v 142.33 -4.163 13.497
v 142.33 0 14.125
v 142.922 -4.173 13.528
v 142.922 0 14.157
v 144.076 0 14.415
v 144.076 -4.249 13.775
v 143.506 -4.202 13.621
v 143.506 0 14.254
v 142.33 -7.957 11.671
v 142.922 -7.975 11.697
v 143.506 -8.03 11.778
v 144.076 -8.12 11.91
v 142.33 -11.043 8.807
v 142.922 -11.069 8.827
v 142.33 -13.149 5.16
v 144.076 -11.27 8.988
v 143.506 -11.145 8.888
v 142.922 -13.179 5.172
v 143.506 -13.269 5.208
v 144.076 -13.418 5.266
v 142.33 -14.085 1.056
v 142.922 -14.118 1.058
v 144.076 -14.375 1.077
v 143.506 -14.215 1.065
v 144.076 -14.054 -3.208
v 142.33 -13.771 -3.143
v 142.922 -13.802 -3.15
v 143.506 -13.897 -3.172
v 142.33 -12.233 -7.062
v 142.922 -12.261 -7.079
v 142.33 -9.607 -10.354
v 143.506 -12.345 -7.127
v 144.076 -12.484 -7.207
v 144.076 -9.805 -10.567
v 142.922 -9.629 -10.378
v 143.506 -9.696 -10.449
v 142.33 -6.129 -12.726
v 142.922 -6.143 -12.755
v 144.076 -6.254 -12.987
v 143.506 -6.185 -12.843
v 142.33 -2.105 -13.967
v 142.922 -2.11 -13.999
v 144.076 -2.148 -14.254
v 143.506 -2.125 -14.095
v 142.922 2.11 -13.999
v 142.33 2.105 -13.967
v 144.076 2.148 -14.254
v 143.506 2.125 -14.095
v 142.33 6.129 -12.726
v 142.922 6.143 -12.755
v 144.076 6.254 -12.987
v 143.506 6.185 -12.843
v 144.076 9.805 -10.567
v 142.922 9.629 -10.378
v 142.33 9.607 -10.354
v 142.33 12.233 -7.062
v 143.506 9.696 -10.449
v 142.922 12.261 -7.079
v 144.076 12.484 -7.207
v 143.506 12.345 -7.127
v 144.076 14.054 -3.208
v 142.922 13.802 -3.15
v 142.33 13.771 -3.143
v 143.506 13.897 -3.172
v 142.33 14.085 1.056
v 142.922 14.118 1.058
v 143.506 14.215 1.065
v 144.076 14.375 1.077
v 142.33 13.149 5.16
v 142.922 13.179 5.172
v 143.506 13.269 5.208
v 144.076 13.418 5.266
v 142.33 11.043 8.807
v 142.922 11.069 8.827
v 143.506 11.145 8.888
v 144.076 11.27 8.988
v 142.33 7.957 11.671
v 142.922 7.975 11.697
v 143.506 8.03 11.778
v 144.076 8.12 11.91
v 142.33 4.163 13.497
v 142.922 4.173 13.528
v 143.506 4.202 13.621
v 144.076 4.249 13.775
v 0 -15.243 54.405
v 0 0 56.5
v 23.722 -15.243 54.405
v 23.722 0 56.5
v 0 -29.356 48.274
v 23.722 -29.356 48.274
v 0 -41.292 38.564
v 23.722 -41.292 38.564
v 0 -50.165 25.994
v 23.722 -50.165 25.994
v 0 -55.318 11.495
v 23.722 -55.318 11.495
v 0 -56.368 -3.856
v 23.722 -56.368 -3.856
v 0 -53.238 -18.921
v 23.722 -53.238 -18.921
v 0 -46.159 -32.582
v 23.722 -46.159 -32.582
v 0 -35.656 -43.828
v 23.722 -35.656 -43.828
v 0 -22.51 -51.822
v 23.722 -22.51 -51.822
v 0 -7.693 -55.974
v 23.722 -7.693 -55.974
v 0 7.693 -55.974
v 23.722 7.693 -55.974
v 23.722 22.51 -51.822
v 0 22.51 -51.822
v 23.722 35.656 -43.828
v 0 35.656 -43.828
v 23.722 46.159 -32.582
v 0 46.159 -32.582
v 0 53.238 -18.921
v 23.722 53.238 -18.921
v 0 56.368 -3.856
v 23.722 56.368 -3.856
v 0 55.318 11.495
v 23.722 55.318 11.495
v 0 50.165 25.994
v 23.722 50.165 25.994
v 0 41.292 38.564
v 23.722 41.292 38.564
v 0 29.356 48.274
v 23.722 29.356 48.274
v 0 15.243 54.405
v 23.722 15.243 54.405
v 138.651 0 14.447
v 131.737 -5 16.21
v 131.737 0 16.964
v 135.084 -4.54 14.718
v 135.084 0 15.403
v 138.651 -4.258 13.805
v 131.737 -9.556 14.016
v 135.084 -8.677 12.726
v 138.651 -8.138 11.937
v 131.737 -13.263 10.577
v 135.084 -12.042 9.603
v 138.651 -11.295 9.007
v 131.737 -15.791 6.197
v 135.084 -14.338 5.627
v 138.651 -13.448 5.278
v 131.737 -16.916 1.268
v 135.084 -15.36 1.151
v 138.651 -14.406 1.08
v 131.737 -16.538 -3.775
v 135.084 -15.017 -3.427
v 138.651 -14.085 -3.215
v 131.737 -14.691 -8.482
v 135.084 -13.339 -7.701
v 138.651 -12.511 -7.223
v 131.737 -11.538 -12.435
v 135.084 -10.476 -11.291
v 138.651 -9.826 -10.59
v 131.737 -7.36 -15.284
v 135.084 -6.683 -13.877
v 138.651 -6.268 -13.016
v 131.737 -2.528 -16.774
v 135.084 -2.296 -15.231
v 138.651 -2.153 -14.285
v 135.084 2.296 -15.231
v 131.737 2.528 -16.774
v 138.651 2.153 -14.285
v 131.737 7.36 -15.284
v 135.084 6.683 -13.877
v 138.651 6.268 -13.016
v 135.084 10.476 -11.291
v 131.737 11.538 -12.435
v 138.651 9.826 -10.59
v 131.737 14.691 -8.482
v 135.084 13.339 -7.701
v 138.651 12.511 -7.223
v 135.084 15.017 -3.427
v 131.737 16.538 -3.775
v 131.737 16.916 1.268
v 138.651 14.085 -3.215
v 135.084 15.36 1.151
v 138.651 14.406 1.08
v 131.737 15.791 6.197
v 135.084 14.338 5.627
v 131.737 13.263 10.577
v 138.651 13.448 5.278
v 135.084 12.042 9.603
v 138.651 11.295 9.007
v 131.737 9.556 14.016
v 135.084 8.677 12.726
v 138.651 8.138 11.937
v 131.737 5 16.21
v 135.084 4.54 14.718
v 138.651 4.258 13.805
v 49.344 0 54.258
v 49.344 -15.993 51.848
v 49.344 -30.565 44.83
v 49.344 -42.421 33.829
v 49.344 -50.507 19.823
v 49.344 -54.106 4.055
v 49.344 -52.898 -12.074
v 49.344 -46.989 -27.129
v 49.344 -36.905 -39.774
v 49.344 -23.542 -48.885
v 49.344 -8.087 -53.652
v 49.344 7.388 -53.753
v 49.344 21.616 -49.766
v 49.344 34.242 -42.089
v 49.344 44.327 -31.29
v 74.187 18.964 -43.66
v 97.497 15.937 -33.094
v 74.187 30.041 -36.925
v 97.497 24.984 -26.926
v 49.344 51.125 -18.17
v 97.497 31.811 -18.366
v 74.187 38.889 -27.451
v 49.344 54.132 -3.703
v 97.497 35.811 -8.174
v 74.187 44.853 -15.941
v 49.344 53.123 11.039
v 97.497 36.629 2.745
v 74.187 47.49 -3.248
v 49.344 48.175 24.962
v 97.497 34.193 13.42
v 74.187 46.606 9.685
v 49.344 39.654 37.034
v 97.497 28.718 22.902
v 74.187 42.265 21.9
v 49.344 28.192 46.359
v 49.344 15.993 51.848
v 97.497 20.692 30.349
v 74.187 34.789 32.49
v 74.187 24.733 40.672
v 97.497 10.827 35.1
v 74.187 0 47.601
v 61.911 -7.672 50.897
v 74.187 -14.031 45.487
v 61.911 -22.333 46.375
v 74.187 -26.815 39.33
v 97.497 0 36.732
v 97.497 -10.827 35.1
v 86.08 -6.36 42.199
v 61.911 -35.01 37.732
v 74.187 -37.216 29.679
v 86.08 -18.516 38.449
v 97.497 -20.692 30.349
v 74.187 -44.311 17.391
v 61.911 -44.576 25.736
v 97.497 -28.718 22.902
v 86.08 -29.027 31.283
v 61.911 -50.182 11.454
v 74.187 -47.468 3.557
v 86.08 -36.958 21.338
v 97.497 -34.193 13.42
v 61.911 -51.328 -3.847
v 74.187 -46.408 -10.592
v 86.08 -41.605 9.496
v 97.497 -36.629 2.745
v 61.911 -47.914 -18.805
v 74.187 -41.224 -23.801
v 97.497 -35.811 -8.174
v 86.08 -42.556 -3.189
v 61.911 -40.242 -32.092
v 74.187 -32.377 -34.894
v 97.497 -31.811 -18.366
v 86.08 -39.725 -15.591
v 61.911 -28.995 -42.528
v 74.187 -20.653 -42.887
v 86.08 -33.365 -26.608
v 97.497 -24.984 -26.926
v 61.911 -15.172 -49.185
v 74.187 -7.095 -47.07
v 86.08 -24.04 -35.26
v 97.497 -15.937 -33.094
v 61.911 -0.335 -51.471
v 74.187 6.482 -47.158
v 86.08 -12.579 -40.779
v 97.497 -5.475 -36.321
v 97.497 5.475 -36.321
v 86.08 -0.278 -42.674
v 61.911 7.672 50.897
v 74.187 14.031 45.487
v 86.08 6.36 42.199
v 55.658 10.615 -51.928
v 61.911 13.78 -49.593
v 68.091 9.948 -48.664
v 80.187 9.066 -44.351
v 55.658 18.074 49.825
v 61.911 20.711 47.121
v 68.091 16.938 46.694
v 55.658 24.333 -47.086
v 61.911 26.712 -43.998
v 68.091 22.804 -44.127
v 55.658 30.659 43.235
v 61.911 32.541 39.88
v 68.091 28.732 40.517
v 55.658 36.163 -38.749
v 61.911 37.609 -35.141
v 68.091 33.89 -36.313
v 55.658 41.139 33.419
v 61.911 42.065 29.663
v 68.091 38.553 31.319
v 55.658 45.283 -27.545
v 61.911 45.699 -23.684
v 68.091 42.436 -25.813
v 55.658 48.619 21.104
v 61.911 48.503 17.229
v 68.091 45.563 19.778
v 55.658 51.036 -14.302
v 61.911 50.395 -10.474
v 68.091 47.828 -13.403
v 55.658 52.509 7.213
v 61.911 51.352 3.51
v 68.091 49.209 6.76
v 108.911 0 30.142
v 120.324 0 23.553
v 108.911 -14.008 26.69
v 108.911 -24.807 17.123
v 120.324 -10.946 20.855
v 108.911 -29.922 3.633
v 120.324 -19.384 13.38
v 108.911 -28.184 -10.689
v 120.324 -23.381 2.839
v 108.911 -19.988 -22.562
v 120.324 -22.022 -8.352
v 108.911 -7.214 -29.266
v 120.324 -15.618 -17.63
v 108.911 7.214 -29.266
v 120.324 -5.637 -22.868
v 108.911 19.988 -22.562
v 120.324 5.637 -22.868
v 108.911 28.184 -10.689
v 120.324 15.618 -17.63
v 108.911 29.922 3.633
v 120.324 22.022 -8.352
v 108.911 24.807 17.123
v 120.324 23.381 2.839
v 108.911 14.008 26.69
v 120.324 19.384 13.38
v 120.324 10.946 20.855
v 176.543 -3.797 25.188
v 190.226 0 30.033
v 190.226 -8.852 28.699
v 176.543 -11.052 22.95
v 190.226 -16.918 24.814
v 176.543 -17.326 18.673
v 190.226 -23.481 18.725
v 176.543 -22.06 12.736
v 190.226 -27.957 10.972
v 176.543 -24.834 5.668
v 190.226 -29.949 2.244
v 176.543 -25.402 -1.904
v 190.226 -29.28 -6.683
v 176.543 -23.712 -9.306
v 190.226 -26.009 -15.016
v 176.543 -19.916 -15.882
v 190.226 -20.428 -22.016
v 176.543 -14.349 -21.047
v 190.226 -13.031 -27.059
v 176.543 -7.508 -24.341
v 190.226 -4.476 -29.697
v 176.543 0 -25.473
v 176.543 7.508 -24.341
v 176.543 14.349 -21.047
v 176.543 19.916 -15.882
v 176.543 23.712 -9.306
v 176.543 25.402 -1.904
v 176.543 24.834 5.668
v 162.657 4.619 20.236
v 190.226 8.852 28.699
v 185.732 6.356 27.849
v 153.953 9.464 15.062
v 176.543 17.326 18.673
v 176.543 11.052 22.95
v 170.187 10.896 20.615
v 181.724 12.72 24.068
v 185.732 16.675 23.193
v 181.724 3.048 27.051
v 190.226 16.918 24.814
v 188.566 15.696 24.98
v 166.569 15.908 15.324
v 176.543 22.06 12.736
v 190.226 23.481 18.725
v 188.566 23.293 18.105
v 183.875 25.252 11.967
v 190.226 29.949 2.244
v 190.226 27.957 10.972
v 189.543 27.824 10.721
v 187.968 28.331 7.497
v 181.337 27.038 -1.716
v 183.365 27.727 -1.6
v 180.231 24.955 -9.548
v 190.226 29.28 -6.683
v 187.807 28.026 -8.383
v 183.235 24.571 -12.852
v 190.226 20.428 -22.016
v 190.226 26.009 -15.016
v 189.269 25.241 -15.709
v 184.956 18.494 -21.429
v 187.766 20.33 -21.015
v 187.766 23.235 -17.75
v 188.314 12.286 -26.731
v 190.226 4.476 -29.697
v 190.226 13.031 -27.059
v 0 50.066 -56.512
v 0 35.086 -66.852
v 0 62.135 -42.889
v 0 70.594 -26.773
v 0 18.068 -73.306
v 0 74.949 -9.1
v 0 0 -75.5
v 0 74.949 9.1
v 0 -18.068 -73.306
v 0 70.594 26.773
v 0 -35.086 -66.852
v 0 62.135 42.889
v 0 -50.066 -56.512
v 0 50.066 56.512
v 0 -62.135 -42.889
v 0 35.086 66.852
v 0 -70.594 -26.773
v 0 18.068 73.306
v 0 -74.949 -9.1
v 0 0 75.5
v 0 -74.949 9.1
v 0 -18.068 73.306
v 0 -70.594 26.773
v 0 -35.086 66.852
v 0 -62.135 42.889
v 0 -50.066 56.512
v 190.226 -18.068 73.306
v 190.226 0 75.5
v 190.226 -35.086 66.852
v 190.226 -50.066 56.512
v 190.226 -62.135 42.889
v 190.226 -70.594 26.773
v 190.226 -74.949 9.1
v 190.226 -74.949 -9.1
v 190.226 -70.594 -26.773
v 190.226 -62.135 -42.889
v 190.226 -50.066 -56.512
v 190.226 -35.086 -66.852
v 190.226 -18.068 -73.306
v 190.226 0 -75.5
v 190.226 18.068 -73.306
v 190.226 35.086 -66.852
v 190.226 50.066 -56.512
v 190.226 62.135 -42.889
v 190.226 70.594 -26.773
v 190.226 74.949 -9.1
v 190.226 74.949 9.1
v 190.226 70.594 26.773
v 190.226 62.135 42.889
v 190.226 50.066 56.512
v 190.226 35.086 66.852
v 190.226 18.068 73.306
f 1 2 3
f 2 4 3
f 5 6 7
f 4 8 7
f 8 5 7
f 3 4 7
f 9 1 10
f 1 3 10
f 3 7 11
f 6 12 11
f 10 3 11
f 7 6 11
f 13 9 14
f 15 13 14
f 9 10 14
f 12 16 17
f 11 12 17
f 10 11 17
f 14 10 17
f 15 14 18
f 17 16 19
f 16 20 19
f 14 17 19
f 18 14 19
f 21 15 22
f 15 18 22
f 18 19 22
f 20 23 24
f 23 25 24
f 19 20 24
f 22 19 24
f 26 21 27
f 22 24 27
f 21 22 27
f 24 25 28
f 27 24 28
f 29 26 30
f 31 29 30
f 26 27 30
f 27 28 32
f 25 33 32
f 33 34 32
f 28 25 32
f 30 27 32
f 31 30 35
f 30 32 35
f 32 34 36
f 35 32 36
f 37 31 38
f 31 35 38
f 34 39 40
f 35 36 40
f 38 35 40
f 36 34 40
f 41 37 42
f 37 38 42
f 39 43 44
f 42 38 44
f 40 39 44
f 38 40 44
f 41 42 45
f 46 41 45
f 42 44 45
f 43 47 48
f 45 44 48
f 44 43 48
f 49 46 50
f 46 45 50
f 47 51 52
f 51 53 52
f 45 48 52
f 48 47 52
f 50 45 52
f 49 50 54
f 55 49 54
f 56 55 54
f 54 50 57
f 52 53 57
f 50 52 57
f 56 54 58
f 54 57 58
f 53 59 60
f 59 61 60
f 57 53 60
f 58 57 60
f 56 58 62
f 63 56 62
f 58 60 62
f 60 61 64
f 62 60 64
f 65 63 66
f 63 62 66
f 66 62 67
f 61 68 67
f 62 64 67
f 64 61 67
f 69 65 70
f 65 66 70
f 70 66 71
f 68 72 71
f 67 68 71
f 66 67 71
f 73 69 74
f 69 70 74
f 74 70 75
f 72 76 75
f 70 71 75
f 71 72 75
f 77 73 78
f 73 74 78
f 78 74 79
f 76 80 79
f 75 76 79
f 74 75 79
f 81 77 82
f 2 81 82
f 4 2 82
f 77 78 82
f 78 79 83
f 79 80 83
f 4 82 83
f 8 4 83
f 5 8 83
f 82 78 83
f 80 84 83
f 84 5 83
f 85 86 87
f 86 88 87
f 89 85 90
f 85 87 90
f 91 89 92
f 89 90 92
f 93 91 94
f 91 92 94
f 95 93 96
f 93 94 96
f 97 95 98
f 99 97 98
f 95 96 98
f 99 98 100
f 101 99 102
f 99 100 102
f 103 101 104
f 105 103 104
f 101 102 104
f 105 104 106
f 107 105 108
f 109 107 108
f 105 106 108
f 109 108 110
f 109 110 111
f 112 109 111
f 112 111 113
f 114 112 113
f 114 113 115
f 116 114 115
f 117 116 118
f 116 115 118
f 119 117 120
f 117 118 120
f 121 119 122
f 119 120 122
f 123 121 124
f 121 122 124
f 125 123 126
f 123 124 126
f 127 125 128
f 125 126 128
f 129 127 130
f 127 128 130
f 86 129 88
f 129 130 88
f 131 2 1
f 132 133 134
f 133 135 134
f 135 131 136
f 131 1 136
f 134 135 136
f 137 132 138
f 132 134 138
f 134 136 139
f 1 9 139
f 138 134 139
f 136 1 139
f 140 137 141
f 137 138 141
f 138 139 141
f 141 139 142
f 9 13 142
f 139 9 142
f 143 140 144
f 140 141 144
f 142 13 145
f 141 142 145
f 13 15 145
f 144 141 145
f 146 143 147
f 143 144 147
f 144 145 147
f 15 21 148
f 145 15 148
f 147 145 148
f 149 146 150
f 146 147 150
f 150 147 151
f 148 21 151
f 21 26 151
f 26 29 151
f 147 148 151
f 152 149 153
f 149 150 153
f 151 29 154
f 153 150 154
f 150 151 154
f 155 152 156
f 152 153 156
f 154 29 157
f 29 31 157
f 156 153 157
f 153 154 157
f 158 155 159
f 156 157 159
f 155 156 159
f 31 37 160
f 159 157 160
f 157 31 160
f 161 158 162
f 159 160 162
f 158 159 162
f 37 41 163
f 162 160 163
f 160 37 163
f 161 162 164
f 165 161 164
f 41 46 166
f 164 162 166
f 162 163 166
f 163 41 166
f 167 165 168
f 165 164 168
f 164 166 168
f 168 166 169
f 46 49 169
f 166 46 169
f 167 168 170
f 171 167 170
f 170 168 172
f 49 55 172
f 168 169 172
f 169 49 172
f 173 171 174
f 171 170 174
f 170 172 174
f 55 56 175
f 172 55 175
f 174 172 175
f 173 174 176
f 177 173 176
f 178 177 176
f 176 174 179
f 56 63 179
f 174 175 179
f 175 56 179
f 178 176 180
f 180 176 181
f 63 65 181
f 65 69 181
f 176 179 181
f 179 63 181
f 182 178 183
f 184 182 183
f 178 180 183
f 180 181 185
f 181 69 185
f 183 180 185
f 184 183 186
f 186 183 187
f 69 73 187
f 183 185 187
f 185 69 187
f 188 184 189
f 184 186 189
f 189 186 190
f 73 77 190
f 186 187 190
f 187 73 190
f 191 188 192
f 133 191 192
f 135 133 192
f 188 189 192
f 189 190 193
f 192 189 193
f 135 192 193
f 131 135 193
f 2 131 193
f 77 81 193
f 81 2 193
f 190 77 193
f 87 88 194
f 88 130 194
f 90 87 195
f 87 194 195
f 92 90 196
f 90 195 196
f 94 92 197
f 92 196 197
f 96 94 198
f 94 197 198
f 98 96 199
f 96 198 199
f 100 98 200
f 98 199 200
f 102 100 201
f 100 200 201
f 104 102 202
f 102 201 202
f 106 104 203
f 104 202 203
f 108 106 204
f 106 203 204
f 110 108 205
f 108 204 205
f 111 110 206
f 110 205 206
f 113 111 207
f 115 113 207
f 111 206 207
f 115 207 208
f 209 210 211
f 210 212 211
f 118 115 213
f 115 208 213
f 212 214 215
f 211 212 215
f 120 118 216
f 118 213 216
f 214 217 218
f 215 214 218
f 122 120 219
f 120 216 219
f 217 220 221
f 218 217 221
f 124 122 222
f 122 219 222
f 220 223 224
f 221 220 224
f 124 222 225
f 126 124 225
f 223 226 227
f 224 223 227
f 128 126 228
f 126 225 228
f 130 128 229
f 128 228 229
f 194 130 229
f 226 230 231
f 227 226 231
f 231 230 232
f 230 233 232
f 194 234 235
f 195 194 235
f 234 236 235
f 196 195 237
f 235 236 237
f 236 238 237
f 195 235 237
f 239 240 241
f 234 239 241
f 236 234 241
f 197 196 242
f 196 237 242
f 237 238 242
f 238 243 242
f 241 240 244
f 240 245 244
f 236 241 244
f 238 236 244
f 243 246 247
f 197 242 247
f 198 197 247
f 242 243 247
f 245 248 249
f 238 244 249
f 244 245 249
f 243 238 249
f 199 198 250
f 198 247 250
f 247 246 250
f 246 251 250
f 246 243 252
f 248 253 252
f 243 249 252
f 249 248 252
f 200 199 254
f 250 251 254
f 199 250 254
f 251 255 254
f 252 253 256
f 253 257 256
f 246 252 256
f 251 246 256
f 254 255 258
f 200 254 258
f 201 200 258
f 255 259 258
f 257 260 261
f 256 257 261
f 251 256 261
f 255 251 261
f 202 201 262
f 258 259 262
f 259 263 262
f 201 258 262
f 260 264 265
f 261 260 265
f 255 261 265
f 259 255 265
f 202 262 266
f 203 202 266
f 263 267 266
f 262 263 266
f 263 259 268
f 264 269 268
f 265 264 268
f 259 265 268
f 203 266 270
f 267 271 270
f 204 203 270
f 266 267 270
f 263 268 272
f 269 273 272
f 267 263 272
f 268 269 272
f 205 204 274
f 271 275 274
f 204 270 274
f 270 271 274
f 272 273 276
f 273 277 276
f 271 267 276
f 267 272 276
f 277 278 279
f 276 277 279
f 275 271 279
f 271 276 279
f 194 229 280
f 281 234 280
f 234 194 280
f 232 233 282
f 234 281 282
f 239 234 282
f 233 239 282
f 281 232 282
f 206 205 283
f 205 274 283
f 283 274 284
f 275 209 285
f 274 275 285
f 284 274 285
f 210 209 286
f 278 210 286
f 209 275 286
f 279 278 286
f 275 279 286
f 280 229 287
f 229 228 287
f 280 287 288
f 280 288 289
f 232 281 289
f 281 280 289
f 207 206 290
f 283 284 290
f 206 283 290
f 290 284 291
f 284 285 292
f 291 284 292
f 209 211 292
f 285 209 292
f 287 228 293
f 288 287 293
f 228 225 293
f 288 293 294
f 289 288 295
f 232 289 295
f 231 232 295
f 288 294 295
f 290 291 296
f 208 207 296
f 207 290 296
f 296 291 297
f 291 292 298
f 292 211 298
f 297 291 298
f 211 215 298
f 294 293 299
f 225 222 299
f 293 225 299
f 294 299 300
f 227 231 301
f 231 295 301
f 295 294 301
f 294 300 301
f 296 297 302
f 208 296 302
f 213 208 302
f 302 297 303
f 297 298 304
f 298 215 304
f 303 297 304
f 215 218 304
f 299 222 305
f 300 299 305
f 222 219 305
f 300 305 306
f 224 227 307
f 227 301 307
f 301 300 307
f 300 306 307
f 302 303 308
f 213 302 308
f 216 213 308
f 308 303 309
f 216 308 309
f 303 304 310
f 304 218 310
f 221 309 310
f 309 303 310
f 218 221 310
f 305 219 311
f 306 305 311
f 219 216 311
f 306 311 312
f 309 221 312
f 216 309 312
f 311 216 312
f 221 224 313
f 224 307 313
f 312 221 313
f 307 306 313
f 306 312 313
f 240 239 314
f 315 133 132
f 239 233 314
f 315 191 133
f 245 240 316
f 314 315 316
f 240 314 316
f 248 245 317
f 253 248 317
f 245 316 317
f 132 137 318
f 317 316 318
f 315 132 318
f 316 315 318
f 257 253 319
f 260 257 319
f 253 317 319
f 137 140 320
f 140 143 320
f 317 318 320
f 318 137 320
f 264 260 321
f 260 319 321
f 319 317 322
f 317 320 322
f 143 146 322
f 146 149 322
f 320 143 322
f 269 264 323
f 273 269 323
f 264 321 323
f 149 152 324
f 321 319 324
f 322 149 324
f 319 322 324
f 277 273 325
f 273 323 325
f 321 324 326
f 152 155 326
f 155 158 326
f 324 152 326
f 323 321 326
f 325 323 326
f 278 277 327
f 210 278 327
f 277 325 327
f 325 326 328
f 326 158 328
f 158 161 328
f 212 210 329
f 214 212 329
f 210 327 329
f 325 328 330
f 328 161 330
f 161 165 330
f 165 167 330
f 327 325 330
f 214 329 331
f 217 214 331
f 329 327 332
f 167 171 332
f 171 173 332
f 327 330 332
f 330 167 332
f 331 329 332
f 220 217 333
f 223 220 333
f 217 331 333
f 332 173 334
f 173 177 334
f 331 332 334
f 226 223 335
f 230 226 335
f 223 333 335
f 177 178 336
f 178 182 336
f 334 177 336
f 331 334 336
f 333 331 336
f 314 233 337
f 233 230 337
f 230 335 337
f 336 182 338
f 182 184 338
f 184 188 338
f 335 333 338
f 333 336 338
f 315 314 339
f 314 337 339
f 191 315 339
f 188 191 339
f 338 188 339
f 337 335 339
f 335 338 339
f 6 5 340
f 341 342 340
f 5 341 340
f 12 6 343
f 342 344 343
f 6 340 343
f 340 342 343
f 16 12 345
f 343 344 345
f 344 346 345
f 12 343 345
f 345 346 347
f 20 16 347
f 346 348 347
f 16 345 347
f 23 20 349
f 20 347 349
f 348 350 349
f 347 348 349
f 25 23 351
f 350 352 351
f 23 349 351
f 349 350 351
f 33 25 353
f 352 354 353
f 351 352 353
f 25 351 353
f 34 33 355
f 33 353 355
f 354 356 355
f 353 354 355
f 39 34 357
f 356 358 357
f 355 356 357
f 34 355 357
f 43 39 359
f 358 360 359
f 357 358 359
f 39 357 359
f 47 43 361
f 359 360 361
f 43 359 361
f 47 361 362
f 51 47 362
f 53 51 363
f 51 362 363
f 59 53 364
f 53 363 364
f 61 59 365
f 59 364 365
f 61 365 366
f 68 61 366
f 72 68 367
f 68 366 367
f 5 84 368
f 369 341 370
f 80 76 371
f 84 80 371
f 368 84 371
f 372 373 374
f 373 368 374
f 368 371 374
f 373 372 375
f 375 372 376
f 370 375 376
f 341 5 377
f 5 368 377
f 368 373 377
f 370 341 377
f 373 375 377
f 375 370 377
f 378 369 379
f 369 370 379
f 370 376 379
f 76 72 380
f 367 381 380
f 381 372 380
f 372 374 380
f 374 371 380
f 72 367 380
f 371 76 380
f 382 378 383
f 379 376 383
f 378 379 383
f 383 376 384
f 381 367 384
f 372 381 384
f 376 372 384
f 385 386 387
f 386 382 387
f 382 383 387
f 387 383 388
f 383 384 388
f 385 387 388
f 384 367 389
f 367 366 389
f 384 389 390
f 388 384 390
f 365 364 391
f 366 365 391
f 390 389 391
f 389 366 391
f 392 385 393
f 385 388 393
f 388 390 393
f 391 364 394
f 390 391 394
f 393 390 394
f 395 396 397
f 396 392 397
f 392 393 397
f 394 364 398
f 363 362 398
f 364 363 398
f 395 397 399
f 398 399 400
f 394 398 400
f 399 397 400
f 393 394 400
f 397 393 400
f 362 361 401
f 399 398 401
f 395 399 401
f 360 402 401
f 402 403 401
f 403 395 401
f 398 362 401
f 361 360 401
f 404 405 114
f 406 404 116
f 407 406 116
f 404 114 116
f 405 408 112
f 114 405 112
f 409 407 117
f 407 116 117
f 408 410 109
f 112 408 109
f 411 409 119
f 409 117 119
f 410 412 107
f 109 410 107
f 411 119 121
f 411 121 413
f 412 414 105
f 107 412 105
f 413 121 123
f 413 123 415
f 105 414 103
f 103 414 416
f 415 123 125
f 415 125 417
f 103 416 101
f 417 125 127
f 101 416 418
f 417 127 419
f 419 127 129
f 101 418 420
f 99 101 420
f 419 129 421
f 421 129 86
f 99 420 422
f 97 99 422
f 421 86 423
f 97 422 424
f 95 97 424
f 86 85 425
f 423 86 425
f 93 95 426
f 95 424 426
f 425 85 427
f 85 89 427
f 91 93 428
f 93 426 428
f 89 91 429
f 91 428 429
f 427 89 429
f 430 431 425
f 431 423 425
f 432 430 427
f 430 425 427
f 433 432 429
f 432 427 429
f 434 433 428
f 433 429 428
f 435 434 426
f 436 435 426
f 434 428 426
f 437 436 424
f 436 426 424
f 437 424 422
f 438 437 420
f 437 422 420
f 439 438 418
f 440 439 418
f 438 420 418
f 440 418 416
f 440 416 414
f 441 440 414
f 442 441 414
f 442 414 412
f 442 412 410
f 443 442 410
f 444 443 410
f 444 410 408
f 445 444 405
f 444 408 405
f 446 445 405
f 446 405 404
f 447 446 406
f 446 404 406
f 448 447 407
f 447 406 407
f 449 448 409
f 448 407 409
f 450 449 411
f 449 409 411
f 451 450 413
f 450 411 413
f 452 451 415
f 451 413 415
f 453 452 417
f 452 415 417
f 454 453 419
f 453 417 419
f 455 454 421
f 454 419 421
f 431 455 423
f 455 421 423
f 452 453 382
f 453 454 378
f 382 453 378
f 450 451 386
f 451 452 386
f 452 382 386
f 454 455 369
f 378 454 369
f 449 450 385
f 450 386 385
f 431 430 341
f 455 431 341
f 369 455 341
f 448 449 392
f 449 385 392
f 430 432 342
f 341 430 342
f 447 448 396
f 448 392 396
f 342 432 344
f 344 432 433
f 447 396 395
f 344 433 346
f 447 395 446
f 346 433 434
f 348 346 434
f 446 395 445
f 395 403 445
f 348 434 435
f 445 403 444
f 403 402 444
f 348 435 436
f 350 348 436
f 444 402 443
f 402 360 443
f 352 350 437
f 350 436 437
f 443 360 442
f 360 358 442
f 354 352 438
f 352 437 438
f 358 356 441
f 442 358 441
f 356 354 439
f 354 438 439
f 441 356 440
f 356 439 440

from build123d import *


with BuildPart() as part:
    # Model → Revolve1 (revolve)
    with BuildSketch(Plane.XY, mode=Mode.PRIVATE) as revolve1_sk:
        with BuildLine():
            Line((0, 56.499761536), (23.721747443, 56.499761536))
            ThreePointArc((23.721747443, 56.499761536), (61.910828562, 51.472073195), (97.497386789, 36.731637642))
            Line((97.497386789, 36.731637642), (131.736780289, 16.963514588))
            ThreePointArc((131.736780289, 16.963514588), (136.846780231, 14.84688352), (142.330485577, 14.124940199))
            ThreePointArc((142.330485577, 14.124940199), (143.215010337, 14.197934269), (144.075603175, 14.414941534))
            add(Edge.make_bspline(
                [(144.075603175, 14.414941534), (185.934060843, 28.722002721), (190.226374917, 30.032918805)],
                knots=[0, 0, 0, 1, 1, 1], degree=2))
            Line((190.226374917, 30.032918805), (190.226374917, 75.499761536))
            Line((190.226374917, 75.499761536), (0, 75.499761536))
            Line((0, 75.499761536), (0, 56.499761536))
        make_face()
    revolve(revolve1_sk.sketch.rotate(Axis((0, 0, 0), (1, 0, 0)), 90), axis=Axis((0, 0, 0), (1, 0, 0)))


solid = part.part
